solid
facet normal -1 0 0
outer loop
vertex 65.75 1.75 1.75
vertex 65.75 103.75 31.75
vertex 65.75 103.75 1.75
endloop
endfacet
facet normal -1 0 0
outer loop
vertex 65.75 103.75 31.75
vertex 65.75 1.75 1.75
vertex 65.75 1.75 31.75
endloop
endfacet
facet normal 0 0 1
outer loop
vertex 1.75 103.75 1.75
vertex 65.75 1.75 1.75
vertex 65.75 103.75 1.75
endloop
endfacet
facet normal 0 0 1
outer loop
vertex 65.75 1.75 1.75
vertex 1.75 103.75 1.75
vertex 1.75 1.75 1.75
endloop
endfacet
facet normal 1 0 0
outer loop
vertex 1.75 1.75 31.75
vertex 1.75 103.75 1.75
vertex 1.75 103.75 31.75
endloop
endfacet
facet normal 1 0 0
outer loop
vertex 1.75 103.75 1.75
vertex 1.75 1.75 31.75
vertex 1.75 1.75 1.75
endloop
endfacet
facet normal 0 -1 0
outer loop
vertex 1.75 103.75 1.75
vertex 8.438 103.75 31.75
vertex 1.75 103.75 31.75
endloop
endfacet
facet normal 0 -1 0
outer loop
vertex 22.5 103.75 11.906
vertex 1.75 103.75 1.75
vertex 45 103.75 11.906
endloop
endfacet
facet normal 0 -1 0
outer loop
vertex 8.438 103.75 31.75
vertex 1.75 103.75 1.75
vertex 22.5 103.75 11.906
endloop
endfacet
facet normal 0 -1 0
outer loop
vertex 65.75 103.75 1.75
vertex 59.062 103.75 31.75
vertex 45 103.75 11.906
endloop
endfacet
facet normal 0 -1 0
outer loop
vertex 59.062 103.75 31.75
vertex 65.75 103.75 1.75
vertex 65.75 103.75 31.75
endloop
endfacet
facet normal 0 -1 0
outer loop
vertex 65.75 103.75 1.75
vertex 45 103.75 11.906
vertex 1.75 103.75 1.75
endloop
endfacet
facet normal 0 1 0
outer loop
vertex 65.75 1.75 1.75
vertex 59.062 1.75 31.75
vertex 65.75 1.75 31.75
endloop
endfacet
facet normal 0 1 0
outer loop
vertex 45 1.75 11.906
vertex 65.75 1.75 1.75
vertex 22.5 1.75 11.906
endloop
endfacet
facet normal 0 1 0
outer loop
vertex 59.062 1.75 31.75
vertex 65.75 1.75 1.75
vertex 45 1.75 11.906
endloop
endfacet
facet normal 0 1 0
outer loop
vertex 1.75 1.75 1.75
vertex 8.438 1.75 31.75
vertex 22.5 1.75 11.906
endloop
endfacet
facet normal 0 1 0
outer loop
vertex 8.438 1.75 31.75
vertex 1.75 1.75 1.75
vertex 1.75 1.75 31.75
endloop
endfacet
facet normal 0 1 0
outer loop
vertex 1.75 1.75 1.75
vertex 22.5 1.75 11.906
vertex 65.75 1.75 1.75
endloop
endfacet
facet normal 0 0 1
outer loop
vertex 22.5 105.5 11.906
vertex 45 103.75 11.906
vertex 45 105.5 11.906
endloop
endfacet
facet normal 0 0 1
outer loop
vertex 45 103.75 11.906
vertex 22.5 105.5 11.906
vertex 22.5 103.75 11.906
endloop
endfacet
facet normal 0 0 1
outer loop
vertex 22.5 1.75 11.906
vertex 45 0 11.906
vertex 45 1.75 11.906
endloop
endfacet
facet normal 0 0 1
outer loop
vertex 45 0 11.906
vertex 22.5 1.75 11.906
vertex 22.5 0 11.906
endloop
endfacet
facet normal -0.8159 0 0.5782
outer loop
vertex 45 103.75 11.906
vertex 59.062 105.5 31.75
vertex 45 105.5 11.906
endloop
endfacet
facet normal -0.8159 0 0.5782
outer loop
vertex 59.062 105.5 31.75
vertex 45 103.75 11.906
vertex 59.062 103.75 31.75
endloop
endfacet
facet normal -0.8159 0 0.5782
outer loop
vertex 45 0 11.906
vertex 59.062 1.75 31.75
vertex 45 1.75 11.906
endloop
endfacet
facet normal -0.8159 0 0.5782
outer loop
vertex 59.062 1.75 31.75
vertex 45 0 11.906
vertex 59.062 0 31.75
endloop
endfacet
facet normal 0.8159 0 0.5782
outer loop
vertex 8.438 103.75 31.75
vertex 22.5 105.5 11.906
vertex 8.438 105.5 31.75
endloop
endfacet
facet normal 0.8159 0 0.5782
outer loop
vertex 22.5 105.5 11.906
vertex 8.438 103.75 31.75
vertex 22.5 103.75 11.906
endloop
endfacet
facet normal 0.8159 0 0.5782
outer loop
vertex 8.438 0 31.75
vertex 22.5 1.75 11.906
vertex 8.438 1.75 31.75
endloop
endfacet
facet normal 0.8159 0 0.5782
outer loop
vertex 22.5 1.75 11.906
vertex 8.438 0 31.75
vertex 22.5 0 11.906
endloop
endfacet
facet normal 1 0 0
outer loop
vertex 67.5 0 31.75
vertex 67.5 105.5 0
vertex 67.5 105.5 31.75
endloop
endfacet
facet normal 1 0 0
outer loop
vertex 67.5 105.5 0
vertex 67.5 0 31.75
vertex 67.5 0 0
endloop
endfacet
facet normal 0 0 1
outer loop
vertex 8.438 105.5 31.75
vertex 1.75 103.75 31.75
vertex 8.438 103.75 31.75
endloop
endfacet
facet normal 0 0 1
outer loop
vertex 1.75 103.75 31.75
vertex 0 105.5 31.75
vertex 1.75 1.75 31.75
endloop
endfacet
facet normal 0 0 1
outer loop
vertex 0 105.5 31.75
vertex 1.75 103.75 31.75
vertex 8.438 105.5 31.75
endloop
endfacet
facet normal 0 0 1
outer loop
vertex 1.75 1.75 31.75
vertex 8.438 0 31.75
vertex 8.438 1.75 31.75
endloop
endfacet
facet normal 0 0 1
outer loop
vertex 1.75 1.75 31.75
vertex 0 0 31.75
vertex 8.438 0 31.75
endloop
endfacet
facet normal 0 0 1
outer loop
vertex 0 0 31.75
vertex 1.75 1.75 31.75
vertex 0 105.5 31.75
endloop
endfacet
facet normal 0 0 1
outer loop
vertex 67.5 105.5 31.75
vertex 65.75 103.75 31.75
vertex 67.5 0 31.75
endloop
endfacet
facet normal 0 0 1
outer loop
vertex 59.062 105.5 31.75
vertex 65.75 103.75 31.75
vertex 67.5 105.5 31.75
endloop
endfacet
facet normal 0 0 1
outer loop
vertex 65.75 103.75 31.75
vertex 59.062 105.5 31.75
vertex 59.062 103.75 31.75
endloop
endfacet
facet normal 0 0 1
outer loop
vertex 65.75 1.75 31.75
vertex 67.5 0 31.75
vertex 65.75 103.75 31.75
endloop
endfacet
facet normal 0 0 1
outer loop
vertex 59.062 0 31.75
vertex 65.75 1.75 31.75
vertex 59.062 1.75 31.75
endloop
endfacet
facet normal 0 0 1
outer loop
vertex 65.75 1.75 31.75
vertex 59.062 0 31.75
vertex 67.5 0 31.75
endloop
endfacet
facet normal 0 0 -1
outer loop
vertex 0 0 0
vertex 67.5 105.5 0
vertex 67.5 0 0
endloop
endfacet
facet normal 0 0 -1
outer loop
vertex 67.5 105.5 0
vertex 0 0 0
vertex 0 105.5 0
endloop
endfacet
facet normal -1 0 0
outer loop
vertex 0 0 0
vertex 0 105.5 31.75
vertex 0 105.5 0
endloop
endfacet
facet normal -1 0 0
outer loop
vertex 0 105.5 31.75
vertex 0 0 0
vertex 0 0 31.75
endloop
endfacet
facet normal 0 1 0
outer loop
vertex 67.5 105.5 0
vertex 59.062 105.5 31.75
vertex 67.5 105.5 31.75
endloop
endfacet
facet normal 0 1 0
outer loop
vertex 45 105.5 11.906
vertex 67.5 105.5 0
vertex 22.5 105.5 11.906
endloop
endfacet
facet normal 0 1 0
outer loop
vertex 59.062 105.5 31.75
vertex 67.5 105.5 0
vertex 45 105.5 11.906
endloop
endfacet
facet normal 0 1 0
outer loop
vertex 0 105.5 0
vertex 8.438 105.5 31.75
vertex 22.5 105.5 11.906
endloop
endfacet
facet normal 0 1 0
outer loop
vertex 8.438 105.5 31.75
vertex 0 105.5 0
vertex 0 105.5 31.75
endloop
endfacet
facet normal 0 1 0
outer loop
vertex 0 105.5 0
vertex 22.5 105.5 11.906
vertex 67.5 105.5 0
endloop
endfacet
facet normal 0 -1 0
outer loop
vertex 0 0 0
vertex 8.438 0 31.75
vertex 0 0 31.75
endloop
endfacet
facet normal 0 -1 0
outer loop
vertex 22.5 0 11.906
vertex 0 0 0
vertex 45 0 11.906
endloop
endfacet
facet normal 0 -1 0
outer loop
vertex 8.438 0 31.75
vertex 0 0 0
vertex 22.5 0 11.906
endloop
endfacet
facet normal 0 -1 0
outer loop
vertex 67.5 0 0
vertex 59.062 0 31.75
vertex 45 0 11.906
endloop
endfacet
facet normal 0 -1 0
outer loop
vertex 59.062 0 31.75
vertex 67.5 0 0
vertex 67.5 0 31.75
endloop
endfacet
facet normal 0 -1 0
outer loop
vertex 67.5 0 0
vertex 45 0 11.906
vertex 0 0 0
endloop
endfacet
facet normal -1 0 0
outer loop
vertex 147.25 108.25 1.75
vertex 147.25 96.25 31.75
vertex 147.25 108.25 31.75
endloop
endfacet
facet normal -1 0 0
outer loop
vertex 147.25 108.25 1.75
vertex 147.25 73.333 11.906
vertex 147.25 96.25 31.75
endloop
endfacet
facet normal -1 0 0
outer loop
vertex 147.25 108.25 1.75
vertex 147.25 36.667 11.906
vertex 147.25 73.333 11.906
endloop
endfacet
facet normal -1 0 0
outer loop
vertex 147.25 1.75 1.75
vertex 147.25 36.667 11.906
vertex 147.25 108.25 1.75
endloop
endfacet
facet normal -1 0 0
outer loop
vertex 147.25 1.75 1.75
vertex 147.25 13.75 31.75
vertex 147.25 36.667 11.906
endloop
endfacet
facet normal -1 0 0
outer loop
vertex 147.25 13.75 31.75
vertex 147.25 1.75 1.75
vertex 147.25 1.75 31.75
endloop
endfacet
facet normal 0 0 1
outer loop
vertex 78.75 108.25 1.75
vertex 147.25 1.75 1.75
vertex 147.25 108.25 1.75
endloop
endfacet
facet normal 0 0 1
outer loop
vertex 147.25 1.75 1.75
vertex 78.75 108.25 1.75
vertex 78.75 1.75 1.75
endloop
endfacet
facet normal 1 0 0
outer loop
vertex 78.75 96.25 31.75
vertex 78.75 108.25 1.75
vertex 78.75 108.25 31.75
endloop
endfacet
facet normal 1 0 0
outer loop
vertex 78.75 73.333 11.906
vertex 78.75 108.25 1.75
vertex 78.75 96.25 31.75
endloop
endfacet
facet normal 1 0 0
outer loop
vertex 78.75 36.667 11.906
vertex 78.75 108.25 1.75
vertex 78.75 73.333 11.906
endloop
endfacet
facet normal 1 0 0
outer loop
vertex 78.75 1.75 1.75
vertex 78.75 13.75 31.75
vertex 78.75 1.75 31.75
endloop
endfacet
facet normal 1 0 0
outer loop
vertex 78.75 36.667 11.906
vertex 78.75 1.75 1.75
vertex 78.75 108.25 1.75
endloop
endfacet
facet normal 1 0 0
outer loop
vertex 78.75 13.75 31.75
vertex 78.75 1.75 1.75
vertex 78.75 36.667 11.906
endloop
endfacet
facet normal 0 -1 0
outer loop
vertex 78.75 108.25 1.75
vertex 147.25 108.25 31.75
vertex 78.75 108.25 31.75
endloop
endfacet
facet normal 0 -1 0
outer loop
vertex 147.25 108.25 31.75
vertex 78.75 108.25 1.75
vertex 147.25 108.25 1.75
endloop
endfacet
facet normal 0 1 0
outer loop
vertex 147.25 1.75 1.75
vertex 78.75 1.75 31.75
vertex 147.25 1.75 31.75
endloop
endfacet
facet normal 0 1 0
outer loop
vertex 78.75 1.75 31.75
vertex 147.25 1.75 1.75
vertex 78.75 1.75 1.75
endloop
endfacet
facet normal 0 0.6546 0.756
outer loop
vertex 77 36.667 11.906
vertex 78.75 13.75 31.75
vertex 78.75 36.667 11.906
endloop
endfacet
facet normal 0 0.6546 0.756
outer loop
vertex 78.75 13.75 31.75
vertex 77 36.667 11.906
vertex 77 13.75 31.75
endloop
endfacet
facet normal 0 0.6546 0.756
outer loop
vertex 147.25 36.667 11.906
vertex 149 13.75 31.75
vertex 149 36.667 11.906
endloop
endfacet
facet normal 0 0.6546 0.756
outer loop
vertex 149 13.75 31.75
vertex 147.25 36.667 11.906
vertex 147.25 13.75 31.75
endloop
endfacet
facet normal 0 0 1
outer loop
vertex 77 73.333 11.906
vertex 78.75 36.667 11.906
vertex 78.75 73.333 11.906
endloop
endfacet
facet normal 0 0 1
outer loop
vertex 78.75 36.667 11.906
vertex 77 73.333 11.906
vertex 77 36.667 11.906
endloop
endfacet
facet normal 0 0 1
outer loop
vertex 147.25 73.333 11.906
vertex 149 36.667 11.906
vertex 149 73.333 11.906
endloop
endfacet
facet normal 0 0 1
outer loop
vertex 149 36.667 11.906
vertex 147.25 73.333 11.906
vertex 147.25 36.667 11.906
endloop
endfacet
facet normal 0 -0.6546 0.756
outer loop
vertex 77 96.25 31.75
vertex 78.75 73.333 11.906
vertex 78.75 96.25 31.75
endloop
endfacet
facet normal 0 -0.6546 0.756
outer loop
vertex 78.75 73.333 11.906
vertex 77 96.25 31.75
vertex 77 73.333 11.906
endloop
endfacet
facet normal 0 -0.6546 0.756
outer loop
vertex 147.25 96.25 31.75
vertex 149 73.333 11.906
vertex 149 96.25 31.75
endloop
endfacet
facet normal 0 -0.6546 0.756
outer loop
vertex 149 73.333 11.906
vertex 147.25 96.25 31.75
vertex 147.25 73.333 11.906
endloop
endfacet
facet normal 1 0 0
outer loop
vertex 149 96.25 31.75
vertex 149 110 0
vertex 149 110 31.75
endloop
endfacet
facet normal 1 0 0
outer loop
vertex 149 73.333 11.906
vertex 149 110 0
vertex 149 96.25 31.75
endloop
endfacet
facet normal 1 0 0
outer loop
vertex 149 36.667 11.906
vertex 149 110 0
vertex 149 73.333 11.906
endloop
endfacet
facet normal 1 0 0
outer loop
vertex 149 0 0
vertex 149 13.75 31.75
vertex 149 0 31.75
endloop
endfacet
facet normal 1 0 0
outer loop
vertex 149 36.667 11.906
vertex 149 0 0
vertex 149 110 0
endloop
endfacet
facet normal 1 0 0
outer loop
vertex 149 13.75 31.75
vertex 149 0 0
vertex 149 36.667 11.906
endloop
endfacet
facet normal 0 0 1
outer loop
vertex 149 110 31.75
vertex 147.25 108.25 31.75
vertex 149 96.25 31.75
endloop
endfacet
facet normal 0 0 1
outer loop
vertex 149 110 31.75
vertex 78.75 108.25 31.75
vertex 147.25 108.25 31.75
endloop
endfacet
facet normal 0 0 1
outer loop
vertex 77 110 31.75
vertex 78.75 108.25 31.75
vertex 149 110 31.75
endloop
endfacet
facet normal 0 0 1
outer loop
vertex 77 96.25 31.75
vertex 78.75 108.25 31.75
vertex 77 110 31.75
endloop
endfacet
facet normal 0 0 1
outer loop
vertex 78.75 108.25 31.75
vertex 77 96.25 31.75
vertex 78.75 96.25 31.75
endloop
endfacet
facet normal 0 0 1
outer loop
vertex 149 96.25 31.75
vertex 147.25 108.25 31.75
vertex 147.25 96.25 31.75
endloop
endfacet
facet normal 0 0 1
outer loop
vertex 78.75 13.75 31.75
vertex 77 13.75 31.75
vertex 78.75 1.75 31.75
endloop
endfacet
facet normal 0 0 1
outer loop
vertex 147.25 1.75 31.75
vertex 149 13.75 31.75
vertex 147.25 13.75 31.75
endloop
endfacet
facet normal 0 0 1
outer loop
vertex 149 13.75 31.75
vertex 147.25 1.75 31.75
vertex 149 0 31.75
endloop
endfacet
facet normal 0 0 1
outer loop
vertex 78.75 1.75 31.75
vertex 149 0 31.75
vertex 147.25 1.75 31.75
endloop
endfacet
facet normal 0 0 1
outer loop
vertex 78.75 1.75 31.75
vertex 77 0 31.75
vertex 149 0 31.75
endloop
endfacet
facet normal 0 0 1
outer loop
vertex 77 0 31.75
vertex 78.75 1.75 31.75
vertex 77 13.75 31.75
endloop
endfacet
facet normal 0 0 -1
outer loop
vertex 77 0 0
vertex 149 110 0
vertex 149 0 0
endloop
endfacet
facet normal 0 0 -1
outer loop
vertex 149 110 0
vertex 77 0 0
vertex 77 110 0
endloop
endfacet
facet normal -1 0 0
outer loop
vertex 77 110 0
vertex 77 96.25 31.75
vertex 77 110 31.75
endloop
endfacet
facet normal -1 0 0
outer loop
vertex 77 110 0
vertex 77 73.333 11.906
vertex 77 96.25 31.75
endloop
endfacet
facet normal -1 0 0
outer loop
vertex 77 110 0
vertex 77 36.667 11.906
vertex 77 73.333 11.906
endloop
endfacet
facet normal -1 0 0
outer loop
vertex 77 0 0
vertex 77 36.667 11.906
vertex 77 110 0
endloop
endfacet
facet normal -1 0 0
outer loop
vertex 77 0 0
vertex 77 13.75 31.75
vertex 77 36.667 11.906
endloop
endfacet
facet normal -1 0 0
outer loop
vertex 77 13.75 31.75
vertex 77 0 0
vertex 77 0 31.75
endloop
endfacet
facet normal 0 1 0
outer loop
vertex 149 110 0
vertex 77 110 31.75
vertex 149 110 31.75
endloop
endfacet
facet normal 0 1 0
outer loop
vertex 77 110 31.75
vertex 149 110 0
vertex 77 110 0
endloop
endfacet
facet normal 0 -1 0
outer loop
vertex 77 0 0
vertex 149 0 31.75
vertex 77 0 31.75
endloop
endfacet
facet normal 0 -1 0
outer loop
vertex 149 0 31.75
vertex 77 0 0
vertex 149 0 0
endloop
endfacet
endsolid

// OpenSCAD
// Maximim card width (default 64)
card_size_x = 64;

// Maximum card lenght (default 102)
card_size_y = 102;

// Maximum internal height (default 30)
height = 30;

// Thickness of the walls (default 1.75)
wall_thickness = 1.75;

// Separation between upper and lower (default 0.5)
tolerance = 0.5;

/* {{{ %%SECTION_HEADER%%
 * * * *
 * This header information is automatically generated by KodeUtils.
 *
 * File 'tarjetero.scad' edited by kwendenarmo, last modified: 2017-04-15.
 * This file is part of 'tarjetero' package, please see the readme files for more information about this file and this package.
 *
 * Copyright (C) 2017 by kwendenarmo <kwendenarmo@akornsys-rdi.net>
 * Released under the GNU GPLv3
 *
 *    This program is free software: you can redistribute it and/or modify
 *    it under the terms of the GNU General Public License as published by
 *    the Free Software Foundation, either version 3 of the License, or
 *    (at your option) any later version.
 *
 *    This program is distributed in the hope that it will be useful,
 *    but WITHOUT ANY WARRANTY; without even the implied warranty of
 *    MERCHANTABILITY or FITNESS FOR A PARTICULAR PURPOSE.  See the
 *    GNU General Public License for more details.
 *
 *    You should have received a copy of the GNU General Public License
 *    along with this program.  If not, see <http://www.gnu.org/licenses/>.
 *
 * * * *
 * %%EOS_HEADER%% }}}
 */

$fn=50;

//Standard case size 64x102x30

lower();
translate([card_size_x+(wall_thickness*2+tolerance)*2+5,0,0]) upper();

module upper() {
    box_x=card_size_x+(wall_thickness*2+tolerance)*2;
    box_y=card_size_y+(wall_thickness*2+tolerance)*2;
    box_z=height+wall_thickness;
    inner_box_x=card_size_x+(wall_thickness+tolerance)*2;
    inner_box_y=card_size_y+(wall_thickness+tolerance)*2;

    difference() {
        union() {
            cube([box_x,box_y,box_z]);
        }
        union() {
            translate([wall_thickness,wall_thickness,wall_thickness]) cube([inner_box_x,inner_box_y,height+1]);
            translate([-1,box_y/3,(box_z/8)*3]) hull() {
                cube([box_x+2,box_y/3,1]);
                translate([0,-box_y/3+box_y/8,(box_z/8)*5]) cube([box_x+2,(box_y/8)*6,1]);
            }
        }
    }
}

module lower() {
    box_x=card_size_x+(wall_thickness)*2;
    box_y=card_size_y+(wall_thickness)*2;
    box_z=height+wall_thickness;

    difference() {
        union() {
            cube([box_x,box_y,box_z]);
        }
        union() {
            translate([wall_thickness,wall_thickness,wall_thickness]) cube([card_size_x,card_size_y,height+1]);
            translate([box_x/3,-1,(box_z/8)*3]) hull() {
                cube([box_x/3,box_y+2,1]);
                translate([-box_x/3+box_x/8,0,(box_z/8)*5]) cube([(box_x/8)*6,box_y+2,1]);
            }
        }
    }
}
